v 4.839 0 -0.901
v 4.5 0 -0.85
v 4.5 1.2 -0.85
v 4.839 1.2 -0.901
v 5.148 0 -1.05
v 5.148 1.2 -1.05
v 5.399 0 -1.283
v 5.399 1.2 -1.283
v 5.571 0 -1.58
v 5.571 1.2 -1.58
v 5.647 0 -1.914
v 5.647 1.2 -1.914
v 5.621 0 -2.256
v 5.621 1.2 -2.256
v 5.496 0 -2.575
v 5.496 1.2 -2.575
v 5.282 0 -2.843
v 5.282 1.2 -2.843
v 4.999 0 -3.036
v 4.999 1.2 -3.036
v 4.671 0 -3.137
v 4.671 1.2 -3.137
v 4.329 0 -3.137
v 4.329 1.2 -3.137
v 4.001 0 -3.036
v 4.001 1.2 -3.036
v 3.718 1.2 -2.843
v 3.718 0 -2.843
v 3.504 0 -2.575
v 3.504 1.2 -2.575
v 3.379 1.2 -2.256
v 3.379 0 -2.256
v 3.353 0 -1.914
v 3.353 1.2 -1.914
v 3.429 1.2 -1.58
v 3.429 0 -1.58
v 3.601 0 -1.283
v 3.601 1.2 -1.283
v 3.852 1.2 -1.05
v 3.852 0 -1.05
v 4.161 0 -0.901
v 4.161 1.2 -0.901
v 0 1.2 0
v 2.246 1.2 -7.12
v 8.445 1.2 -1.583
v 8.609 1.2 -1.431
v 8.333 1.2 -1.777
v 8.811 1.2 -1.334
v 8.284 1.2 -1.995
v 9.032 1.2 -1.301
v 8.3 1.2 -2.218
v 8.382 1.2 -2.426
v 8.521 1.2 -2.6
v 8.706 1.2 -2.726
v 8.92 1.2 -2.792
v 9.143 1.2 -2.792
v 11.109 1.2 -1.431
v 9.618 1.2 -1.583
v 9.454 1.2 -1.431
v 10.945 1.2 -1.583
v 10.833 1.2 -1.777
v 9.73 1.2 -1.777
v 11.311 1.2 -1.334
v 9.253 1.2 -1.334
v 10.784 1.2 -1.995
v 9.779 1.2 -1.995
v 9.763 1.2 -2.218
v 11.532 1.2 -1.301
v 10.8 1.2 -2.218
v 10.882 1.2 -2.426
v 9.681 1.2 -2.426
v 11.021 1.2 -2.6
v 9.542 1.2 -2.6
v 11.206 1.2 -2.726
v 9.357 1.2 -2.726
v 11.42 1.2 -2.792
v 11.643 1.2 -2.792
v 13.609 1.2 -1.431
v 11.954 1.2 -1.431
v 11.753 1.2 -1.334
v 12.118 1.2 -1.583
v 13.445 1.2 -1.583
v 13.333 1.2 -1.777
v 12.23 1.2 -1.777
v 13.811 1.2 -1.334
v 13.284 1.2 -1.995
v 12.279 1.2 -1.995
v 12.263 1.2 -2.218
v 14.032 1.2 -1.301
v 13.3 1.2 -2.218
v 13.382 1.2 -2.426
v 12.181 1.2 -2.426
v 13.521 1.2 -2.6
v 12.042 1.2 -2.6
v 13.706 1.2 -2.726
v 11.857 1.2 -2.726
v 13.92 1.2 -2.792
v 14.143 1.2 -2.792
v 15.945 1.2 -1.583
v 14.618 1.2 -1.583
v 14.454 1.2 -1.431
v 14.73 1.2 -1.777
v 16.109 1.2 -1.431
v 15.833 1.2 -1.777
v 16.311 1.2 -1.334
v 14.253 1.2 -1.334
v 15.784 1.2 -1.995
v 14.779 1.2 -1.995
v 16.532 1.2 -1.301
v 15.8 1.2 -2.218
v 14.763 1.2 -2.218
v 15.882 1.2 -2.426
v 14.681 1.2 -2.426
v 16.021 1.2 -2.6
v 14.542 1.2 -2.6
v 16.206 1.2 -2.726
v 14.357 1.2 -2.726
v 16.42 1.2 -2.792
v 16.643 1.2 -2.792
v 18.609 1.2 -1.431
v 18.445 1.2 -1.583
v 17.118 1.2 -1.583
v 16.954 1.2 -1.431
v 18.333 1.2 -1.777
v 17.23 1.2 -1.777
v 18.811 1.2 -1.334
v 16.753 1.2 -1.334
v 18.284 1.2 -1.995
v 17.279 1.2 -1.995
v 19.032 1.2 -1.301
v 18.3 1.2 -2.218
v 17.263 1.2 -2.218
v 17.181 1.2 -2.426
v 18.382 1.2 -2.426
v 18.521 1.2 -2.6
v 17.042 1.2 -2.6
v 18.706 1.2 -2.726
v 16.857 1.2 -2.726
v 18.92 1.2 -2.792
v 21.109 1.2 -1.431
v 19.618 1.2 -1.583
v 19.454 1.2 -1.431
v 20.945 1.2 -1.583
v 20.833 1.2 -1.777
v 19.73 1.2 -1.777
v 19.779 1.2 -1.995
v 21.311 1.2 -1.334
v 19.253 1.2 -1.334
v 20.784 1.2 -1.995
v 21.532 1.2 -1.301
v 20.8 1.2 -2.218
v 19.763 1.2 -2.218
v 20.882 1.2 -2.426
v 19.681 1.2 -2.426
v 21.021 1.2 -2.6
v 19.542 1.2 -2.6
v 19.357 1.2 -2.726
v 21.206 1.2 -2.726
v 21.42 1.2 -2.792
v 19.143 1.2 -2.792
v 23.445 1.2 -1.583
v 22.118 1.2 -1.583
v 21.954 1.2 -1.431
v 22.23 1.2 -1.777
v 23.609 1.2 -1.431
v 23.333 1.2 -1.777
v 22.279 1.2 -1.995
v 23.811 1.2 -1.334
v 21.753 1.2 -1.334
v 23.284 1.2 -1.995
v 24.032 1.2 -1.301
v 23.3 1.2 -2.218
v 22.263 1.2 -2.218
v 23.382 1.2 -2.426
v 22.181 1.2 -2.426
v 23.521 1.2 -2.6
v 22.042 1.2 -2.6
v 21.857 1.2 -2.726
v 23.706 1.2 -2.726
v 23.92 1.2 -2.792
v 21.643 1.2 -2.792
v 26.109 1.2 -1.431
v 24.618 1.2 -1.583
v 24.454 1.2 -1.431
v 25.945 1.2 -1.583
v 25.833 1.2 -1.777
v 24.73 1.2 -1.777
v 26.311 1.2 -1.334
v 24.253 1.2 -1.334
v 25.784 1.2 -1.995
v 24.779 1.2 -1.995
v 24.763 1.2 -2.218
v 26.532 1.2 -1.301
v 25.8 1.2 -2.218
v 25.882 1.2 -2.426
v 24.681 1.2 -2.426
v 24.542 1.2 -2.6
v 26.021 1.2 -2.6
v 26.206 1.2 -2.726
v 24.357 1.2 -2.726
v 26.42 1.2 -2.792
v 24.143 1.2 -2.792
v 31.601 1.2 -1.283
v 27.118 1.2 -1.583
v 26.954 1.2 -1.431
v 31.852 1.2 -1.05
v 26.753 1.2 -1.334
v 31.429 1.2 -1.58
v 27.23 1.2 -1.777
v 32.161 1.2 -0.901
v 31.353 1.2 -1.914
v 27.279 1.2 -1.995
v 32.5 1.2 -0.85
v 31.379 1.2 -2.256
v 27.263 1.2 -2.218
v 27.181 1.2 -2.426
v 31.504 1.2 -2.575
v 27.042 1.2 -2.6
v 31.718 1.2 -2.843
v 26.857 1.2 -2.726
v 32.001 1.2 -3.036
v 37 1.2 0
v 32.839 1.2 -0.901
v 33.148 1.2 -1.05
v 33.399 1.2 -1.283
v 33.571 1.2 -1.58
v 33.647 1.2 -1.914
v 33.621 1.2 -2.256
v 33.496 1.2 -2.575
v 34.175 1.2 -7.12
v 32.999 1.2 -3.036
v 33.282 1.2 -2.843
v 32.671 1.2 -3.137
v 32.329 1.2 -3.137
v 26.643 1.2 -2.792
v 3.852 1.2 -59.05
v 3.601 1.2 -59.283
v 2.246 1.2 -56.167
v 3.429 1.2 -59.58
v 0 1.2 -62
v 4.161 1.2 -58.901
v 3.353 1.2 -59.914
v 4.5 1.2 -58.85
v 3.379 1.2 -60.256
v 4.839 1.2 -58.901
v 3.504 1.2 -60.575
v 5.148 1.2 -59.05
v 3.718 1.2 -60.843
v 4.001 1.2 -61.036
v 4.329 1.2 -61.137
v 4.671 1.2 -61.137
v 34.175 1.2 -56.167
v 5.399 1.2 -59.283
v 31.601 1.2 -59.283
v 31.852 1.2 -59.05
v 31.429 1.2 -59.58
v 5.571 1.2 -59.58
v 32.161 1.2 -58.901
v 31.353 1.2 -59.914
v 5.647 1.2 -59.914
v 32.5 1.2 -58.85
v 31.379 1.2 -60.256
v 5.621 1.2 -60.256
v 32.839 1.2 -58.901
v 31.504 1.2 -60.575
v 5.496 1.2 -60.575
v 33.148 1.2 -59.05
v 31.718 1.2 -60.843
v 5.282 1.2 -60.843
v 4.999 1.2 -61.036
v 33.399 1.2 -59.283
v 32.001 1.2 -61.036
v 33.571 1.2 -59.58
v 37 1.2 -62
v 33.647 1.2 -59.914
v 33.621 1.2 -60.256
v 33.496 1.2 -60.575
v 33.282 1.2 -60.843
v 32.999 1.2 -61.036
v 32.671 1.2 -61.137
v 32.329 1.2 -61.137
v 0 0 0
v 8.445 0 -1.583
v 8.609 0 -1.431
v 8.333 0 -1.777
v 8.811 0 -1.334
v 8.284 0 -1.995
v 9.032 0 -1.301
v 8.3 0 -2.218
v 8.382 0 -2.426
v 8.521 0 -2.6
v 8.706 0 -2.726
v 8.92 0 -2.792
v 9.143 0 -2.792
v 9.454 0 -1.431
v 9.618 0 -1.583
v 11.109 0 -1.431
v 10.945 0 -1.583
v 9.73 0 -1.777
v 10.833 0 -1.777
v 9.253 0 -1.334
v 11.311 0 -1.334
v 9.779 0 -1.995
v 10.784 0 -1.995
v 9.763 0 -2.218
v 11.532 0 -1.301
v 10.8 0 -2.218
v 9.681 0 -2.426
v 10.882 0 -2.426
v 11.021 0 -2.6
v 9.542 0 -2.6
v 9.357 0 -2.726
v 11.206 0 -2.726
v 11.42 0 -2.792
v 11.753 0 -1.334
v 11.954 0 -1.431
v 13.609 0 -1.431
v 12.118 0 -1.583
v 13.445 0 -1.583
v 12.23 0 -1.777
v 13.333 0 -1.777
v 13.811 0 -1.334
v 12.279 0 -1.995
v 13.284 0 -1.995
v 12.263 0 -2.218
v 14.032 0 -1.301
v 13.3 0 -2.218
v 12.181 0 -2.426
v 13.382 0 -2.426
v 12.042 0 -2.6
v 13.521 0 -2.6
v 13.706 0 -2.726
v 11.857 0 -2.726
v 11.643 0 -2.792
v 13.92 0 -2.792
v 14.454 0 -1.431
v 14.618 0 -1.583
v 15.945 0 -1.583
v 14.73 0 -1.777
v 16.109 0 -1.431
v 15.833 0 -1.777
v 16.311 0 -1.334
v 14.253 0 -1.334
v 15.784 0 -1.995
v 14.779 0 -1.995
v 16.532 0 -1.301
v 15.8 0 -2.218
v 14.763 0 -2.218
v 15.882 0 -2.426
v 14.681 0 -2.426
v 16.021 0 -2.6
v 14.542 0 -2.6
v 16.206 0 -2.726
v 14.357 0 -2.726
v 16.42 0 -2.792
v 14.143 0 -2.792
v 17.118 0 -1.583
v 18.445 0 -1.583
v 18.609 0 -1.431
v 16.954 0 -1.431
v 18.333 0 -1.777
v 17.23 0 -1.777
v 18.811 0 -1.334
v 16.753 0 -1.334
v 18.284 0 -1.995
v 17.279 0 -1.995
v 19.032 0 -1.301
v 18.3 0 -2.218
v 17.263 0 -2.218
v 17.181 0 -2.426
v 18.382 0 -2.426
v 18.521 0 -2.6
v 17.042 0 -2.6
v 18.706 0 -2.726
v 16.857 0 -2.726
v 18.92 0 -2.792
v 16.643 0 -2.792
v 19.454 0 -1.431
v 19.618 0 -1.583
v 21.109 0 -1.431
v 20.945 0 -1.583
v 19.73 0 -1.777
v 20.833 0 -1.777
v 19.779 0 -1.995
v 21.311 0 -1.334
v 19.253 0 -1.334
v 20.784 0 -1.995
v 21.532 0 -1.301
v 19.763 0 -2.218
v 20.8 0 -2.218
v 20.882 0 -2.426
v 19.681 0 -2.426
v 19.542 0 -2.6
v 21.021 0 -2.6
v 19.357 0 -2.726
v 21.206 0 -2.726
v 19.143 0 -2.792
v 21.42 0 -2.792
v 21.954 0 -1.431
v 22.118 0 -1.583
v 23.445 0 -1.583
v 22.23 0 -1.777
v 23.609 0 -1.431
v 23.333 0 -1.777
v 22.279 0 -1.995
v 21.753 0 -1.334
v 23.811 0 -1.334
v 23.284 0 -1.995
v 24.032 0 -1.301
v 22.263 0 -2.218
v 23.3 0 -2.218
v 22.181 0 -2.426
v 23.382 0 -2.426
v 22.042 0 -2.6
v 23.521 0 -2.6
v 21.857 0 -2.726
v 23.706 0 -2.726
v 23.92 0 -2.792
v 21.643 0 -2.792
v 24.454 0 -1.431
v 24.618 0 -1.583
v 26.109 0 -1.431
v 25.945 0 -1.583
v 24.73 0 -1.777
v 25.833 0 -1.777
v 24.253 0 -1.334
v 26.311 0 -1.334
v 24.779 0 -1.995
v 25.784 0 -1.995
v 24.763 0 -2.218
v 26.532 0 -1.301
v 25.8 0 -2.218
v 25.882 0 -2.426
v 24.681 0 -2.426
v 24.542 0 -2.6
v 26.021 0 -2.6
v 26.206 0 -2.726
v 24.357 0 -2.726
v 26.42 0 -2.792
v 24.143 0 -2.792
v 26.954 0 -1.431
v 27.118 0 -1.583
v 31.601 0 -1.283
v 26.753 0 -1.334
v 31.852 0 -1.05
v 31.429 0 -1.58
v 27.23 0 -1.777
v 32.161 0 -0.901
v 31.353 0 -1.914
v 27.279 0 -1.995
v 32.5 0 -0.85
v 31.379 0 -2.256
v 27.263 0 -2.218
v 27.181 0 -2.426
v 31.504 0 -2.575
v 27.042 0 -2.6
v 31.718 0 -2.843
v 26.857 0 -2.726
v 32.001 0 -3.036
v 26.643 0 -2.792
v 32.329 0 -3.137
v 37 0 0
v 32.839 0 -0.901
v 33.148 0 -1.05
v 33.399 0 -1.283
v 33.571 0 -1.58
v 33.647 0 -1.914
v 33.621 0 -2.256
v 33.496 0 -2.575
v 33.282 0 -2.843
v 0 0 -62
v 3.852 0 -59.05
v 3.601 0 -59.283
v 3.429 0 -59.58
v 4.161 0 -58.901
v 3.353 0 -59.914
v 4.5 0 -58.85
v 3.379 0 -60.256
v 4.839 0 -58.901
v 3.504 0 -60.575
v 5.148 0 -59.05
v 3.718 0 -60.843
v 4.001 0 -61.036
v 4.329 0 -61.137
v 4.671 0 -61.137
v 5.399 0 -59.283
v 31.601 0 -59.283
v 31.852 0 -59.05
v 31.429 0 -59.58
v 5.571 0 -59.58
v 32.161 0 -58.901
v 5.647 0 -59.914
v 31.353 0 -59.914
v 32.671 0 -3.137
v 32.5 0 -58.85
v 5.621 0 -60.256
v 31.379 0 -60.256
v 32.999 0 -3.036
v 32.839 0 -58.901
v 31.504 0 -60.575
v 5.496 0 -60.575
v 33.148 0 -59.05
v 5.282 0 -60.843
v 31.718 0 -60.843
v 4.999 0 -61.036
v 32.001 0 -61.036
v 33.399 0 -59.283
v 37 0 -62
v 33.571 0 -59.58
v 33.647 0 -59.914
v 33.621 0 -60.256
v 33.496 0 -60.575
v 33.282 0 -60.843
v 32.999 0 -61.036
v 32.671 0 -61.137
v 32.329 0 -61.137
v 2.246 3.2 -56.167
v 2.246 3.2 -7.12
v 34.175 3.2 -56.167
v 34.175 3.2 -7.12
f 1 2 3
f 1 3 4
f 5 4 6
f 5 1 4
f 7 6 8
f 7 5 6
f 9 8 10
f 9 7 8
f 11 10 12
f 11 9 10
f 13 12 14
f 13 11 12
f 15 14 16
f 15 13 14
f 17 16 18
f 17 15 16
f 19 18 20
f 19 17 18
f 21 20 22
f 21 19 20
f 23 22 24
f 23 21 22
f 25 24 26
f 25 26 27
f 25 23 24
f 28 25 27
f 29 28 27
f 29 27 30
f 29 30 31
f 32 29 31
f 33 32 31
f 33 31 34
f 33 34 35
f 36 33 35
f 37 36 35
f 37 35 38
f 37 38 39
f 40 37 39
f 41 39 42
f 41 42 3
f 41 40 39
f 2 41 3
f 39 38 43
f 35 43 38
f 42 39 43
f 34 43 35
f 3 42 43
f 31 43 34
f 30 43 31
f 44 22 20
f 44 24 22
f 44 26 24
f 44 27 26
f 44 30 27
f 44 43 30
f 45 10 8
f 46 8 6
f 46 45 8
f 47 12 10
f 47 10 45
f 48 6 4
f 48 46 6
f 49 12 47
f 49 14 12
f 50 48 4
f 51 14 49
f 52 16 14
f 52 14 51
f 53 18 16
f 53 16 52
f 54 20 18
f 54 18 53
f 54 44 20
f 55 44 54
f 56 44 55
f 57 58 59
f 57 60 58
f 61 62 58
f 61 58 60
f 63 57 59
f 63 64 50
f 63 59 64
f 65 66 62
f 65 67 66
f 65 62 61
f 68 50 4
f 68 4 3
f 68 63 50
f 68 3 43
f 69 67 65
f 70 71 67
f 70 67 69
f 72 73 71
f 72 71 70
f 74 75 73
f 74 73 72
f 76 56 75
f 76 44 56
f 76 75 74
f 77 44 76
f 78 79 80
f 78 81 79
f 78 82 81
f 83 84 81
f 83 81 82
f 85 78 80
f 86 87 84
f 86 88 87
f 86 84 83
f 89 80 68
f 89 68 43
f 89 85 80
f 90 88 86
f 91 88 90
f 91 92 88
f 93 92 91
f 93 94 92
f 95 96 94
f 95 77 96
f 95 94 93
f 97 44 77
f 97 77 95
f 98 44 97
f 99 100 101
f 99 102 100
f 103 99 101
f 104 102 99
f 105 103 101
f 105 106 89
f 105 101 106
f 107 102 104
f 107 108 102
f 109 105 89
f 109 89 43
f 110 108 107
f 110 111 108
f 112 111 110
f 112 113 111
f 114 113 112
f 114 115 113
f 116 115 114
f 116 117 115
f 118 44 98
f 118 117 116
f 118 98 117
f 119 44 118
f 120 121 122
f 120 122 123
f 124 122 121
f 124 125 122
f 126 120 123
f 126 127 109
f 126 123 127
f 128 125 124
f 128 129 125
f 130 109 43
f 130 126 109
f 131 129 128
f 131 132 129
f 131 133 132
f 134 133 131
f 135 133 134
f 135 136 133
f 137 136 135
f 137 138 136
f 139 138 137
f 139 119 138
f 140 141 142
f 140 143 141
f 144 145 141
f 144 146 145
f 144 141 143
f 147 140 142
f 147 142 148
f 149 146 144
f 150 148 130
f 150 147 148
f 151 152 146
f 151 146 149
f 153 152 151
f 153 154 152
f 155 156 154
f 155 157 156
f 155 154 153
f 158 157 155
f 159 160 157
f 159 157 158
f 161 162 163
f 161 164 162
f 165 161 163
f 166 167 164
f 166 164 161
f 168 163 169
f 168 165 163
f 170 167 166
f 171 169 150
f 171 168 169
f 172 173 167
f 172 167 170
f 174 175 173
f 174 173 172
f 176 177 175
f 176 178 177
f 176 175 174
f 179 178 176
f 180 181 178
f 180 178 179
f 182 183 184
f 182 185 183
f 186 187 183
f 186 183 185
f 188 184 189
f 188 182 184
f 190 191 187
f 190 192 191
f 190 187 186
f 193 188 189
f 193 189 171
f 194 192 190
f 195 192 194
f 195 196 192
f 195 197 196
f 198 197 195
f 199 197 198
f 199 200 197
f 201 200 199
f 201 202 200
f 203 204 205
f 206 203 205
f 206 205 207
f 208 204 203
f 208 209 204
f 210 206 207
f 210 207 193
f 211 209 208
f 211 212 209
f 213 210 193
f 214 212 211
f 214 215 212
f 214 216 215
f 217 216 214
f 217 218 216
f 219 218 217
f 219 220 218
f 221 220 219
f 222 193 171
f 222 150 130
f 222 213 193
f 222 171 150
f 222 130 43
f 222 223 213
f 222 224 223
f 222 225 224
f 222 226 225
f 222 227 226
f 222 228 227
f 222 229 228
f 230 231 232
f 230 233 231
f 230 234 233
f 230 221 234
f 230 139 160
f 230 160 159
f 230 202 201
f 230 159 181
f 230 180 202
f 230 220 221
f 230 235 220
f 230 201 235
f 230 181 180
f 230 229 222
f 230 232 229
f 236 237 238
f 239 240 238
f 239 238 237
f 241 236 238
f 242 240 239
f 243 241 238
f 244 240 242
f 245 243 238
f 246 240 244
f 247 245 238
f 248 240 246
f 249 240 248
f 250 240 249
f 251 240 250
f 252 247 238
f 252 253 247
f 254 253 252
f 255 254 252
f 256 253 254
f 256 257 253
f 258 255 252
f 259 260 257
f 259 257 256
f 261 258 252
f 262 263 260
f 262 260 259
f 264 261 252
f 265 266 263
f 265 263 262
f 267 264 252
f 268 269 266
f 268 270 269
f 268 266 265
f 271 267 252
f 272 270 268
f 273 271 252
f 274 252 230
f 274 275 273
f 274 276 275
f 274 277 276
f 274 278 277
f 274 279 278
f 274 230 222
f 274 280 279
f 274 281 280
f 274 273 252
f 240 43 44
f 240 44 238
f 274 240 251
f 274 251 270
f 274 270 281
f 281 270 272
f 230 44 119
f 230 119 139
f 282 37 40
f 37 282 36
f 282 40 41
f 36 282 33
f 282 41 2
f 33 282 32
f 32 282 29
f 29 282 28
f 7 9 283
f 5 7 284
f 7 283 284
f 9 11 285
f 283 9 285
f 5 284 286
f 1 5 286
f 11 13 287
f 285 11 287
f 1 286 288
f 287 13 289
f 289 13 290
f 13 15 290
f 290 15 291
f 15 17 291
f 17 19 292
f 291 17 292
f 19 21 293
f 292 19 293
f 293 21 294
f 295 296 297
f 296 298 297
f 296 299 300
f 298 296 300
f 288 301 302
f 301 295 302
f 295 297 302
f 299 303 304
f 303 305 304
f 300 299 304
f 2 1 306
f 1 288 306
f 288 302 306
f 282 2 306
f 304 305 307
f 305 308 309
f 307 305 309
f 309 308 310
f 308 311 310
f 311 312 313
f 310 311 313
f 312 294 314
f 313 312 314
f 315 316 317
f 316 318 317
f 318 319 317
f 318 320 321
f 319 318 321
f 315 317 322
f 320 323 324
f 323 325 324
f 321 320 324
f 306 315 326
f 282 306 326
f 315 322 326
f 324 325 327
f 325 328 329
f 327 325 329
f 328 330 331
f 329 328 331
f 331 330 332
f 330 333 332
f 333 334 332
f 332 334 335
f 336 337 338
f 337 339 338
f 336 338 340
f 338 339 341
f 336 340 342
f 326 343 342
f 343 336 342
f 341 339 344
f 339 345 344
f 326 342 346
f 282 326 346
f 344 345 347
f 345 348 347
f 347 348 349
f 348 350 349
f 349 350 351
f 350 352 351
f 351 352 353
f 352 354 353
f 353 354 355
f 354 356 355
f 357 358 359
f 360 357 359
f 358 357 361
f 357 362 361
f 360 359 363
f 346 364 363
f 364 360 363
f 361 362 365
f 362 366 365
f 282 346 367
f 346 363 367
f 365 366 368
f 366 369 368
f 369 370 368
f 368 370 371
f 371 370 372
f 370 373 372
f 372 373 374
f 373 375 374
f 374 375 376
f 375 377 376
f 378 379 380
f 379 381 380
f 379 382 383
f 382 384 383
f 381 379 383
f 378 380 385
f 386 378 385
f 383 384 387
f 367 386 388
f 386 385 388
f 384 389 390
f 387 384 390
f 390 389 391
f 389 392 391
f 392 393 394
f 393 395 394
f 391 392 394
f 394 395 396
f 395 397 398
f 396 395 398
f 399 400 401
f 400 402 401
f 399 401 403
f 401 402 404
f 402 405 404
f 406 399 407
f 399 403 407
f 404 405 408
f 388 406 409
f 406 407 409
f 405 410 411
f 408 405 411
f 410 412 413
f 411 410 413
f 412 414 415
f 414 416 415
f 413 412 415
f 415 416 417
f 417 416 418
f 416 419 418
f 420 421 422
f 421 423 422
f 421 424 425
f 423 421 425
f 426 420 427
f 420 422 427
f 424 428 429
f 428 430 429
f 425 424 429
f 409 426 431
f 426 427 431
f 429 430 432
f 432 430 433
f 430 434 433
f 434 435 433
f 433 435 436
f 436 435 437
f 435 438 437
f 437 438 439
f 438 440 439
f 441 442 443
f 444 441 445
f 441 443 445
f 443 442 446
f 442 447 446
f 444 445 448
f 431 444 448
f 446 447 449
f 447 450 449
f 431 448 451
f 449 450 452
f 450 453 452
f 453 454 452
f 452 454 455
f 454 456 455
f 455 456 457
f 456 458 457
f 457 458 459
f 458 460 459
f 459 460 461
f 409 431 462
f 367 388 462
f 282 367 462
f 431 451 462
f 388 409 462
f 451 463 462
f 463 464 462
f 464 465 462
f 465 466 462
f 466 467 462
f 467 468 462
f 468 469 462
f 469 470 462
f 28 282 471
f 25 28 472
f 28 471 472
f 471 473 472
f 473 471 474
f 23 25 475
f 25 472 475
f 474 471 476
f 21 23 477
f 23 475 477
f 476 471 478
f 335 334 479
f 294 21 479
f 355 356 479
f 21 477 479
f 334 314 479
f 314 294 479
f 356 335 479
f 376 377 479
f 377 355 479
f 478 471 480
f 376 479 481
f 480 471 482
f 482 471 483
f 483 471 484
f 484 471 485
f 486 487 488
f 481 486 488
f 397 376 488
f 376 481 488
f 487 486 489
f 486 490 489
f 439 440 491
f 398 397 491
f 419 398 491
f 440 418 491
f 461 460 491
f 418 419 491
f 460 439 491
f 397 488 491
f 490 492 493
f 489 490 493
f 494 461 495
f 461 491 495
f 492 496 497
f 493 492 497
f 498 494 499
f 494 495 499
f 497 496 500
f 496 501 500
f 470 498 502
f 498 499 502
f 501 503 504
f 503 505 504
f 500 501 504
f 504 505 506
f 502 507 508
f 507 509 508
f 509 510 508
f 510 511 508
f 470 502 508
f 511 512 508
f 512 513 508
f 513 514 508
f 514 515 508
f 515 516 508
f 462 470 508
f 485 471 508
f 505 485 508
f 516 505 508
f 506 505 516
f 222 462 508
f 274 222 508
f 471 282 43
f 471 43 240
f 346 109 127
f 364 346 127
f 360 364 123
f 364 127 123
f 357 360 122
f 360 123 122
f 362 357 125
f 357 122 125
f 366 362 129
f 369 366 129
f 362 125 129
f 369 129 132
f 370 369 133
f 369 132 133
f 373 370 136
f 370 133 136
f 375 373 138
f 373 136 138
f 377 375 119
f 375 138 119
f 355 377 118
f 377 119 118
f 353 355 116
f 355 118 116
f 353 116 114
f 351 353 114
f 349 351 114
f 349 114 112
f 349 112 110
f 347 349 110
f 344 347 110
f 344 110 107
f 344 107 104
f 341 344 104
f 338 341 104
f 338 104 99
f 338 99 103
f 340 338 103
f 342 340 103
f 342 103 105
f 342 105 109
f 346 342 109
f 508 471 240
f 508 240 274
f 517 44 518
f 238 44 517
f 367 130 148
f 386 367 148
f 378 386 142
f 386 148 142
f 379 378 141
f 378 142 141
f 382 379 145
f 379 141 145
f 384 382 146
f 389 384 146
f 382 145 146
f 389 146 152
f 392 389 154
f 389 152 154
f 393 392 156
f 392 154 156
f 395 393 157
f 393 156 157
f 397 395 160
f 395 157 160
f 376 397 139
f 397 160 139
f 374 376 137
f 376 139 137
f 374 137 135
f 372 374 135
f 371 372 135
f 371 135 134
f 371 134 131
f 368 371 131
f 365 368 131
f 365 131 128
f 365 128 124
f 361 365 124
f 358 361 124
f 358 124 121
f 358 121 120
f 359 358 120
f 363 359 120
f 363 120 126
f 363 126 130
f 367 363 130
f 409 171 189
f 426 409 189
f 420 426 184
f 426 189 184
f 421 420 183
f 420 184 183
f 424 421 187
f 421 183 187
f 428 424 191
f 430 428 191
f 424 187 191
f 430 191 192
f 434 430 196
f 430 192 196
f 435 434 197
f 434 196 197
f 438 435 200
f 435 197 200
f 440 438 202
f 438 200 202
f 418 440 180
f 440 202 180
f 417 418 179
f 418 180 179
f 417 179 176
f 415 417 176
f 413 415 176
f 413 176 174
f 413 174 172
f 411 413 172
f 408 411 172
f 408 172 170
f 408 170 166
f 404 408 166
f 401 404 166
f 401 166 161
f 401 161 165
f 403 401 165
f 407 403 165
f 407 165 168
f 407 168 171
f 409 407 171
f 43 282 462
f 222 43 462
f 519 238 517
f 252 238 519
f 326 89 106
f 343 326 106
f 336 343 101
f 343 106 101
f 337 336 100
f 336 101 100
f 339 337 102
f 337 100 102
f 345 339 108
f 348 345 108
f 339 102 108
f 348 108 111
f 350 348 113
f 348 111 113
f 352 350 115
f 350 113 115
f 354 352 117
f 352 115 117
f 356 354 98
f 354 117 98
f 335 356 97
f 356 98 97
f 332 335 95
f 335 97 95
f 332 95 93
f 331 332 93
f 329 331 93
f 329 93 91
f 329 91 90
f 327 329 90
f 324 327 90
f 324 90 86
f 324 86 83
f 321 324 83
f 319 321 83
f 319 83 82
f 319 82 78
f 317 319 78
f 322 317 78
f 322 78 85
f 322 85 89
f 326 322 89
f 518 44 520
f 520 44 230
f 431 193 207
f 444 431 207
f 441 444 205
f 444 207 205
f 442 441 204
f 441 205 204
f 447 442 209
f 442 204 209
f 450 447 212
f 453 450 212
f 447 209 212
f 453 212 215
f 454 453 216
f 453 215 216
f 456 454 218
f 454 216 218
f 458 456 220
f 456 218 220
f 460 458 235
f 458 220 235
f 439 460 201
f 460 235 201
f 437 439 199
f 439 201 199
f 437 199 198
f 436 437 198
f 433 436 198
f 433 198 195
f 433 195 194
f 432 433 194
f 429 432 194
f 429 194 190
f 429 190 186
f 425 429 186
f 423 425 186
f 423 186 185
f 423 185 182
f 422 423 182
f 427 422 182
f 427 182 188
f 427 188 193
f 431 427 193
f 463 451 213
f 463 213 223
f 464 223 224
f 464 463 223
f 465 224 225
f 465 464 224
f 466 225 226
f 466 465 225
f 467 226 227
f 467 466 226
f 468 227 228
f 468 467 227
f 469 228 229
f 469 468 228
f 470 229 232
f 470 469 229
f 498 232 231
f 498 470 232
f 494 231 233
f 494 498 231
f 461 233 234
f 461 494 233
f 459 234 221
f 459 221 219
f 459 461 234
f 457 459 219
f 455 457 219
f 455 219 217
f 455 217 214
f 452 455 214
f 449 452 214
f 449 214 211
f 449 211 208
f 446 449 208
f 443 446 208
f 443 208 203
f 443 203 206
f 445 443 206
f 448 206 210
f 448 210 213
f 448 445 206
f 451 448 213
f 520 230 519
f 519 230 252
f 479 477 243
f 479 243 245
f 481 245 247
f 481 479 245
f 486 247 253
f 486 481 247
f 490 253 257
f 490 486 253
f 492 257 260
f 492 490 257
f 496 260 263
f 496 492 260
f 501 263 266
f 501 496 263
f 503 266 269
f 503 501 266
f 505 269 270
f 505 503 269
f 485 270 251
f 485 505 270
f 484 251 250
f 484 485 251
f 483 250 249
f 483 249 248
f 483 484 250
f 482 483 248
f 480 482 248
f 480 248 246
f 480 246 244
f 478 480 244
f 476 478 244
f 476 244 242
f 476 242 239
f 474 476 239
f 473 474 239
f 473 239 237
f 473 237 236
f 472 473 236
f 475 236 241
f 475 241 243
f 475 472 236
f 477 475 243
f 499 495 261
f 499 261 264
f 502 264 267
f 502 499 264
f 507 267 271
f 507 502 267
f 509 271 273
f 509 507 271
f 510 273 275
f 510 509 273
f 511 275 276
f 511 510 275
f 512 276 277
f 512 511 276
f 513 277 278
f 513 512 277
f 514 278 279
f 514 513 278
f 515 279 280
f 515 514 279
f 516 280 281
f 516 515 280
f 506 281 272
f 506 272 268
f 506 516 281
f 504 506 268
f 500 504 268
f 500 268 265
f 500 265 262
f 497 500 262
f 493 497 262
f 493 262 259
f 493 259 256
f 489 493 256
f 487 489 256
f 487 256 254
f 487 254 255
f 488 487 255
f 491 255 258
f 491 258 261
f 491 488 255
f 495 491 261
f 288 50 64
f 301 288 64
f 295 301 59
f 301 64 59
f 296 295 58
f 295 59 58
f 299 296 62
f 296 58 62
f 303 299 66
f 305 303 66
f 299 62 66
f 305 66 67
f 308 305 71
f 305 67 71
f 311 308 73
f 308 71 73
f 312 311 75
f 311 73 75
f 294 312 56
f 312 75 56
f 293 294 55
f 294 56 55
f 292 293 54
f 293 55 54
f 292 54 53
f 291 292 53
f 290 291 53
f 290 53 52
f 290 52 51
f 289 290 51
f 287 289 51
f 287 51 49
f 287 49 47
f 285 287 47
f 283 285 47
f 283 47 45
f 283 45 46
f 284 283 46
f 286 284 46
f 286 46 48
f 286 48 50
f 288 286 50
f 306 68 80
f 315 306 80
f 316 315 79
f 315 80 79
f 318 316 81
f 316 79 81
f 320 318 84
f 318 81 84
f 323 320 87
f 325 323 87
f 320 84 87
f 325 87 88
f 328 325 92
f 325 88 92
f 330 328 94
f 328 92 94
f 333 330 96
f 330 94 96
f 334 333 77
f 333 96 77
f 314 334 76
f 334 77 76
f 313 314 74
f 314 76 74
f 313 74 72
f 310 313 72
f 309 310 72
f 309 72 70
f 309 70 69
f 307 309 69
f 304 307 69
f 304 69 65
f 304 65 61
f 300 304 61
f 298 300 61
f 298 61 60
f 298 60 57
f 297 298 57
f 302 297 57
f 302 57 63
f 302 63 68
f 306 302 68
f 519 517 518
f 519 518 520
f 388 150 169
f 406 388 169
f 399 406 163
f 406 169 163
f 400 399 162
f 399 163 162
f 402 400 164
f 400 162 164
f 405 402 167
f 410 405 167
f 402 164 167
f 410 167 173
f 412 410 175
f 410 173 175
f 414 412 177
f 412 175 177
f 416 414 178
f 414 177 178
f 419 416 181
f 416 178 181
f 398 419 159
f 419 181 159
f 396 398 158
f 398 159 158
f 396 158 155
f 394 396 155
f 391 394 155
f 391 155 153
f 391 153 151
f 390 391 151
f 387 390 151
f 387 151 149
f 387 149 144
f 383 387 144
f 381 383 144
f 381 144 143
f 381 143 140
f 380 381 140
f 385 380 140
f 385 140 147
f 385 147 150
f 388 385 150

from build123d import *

# Parameters (mm, degrees)
SKETCH1_W           = 37
SKETCH1_H           = 62
SKETCH1_R           = 1.15
BOSS_EXTRUDE1_DEPTH = 1.2
SKETCH2_W           = 31.928778657
SKETCH2_H           = 49.046896963
BOSS_EXTRUDE2_DEPTH = 2
SKETCH3_R           = 0.75
CUT_EXTRUDE1_DEPTH  = 73.228803119


with BuildPart() as part:
    # Sketch1 → Boss-Extrude1 (new body)
    with BuildSketch(Plane(origin=(0, 0, 0), x_dir=(1, 0, 0), z_dir=(0, 1, 0))):
        with Locations((18.5, 31)):
            Rectangle(SKETCH1_W, SKETCH1_H)
        with Locations(Location((32.5, 60, 0), (0, 0, 270))):
            Circle(SKETCH1_R, mode=Mode.SUBTRACT)
        with Locations(Location((4.5, 60, 0), (0, 0, 270))):
            Circle(SKETCH1_R, mode=Mode.SUBTRACT)
        with Locations(Location((32.5, 2, 0), (0, 0, 270))):
            Circle(SKETCH1_R, mode=Mode.SUBTRACT)
        with Locations(Location((4.5, 2, 0), (0, 0, 270))):
            Circle(SKETCH1_R, mode=Mode.SUBTRACT)
    extrude(amount=BOSS_EXTRUDE1_DEPTH)

    # Sketch2 → Boss-Extrude2 (add)
    with BuildSketch(Plane(origin=(0, 1.2, 0), x_dir=(1, 0, 0), z_dir=(0, 1, 0))):
        with Locations((18.2105599, 31.643941755)):
            Rectangle(SKETCH2_W, SKETCH2_H)
    extrude(amount=BOSS_EXTRUDE2_DEPTH)

    # Sketch3 → Cut-Extrude1 (cut, through all)
    with BuildSketch(Plane(origin=(0, 1.2, 0), x_dir=(1, 0, 0), z_dir=(0, 1, 0))):
        with Locations(Location((9.031578358, 2.050688375, 0), (0, 0, 270))):
            Circle(SKETCH3_R)
        with Locations(Location((11.531578358, 2.050688375, 0), (0, 0, 270))):
            Circle(SKETCH3_R)
        with Locations(Location((14.031578358, 2.050688375, 0), (0, 0, 270))):
            Circle(SKETCH3_R)
        with Locations(Location((16.531578358, 2.050688375, 0), (0, 0, 270))):
            Circle(SKETCH3_R)
        with Locations(Location((19.031578358, 2.050688375, 0), (0, 0, 270))):
            Circle(SKETCH3_R)
        with Locations(Location((21.531578358, 2.050688375, 0), (0, 0, 270))):
            Circle(SKETCH3_R)
        with Locations(Location((24.031578358, 2.050688375, 0), (0, 0, 270))):
            Circle(SKETCH3_R)
        with Locations(Location((26.531578358, 2.050688375, 0), (0, 0, 270))):
            Circle(SKETCH3_R)
    extrude(amount=-CUT_EXTRUDE1_DEPTH, mode=Mode.SUBTRACT)


solid = part.part
